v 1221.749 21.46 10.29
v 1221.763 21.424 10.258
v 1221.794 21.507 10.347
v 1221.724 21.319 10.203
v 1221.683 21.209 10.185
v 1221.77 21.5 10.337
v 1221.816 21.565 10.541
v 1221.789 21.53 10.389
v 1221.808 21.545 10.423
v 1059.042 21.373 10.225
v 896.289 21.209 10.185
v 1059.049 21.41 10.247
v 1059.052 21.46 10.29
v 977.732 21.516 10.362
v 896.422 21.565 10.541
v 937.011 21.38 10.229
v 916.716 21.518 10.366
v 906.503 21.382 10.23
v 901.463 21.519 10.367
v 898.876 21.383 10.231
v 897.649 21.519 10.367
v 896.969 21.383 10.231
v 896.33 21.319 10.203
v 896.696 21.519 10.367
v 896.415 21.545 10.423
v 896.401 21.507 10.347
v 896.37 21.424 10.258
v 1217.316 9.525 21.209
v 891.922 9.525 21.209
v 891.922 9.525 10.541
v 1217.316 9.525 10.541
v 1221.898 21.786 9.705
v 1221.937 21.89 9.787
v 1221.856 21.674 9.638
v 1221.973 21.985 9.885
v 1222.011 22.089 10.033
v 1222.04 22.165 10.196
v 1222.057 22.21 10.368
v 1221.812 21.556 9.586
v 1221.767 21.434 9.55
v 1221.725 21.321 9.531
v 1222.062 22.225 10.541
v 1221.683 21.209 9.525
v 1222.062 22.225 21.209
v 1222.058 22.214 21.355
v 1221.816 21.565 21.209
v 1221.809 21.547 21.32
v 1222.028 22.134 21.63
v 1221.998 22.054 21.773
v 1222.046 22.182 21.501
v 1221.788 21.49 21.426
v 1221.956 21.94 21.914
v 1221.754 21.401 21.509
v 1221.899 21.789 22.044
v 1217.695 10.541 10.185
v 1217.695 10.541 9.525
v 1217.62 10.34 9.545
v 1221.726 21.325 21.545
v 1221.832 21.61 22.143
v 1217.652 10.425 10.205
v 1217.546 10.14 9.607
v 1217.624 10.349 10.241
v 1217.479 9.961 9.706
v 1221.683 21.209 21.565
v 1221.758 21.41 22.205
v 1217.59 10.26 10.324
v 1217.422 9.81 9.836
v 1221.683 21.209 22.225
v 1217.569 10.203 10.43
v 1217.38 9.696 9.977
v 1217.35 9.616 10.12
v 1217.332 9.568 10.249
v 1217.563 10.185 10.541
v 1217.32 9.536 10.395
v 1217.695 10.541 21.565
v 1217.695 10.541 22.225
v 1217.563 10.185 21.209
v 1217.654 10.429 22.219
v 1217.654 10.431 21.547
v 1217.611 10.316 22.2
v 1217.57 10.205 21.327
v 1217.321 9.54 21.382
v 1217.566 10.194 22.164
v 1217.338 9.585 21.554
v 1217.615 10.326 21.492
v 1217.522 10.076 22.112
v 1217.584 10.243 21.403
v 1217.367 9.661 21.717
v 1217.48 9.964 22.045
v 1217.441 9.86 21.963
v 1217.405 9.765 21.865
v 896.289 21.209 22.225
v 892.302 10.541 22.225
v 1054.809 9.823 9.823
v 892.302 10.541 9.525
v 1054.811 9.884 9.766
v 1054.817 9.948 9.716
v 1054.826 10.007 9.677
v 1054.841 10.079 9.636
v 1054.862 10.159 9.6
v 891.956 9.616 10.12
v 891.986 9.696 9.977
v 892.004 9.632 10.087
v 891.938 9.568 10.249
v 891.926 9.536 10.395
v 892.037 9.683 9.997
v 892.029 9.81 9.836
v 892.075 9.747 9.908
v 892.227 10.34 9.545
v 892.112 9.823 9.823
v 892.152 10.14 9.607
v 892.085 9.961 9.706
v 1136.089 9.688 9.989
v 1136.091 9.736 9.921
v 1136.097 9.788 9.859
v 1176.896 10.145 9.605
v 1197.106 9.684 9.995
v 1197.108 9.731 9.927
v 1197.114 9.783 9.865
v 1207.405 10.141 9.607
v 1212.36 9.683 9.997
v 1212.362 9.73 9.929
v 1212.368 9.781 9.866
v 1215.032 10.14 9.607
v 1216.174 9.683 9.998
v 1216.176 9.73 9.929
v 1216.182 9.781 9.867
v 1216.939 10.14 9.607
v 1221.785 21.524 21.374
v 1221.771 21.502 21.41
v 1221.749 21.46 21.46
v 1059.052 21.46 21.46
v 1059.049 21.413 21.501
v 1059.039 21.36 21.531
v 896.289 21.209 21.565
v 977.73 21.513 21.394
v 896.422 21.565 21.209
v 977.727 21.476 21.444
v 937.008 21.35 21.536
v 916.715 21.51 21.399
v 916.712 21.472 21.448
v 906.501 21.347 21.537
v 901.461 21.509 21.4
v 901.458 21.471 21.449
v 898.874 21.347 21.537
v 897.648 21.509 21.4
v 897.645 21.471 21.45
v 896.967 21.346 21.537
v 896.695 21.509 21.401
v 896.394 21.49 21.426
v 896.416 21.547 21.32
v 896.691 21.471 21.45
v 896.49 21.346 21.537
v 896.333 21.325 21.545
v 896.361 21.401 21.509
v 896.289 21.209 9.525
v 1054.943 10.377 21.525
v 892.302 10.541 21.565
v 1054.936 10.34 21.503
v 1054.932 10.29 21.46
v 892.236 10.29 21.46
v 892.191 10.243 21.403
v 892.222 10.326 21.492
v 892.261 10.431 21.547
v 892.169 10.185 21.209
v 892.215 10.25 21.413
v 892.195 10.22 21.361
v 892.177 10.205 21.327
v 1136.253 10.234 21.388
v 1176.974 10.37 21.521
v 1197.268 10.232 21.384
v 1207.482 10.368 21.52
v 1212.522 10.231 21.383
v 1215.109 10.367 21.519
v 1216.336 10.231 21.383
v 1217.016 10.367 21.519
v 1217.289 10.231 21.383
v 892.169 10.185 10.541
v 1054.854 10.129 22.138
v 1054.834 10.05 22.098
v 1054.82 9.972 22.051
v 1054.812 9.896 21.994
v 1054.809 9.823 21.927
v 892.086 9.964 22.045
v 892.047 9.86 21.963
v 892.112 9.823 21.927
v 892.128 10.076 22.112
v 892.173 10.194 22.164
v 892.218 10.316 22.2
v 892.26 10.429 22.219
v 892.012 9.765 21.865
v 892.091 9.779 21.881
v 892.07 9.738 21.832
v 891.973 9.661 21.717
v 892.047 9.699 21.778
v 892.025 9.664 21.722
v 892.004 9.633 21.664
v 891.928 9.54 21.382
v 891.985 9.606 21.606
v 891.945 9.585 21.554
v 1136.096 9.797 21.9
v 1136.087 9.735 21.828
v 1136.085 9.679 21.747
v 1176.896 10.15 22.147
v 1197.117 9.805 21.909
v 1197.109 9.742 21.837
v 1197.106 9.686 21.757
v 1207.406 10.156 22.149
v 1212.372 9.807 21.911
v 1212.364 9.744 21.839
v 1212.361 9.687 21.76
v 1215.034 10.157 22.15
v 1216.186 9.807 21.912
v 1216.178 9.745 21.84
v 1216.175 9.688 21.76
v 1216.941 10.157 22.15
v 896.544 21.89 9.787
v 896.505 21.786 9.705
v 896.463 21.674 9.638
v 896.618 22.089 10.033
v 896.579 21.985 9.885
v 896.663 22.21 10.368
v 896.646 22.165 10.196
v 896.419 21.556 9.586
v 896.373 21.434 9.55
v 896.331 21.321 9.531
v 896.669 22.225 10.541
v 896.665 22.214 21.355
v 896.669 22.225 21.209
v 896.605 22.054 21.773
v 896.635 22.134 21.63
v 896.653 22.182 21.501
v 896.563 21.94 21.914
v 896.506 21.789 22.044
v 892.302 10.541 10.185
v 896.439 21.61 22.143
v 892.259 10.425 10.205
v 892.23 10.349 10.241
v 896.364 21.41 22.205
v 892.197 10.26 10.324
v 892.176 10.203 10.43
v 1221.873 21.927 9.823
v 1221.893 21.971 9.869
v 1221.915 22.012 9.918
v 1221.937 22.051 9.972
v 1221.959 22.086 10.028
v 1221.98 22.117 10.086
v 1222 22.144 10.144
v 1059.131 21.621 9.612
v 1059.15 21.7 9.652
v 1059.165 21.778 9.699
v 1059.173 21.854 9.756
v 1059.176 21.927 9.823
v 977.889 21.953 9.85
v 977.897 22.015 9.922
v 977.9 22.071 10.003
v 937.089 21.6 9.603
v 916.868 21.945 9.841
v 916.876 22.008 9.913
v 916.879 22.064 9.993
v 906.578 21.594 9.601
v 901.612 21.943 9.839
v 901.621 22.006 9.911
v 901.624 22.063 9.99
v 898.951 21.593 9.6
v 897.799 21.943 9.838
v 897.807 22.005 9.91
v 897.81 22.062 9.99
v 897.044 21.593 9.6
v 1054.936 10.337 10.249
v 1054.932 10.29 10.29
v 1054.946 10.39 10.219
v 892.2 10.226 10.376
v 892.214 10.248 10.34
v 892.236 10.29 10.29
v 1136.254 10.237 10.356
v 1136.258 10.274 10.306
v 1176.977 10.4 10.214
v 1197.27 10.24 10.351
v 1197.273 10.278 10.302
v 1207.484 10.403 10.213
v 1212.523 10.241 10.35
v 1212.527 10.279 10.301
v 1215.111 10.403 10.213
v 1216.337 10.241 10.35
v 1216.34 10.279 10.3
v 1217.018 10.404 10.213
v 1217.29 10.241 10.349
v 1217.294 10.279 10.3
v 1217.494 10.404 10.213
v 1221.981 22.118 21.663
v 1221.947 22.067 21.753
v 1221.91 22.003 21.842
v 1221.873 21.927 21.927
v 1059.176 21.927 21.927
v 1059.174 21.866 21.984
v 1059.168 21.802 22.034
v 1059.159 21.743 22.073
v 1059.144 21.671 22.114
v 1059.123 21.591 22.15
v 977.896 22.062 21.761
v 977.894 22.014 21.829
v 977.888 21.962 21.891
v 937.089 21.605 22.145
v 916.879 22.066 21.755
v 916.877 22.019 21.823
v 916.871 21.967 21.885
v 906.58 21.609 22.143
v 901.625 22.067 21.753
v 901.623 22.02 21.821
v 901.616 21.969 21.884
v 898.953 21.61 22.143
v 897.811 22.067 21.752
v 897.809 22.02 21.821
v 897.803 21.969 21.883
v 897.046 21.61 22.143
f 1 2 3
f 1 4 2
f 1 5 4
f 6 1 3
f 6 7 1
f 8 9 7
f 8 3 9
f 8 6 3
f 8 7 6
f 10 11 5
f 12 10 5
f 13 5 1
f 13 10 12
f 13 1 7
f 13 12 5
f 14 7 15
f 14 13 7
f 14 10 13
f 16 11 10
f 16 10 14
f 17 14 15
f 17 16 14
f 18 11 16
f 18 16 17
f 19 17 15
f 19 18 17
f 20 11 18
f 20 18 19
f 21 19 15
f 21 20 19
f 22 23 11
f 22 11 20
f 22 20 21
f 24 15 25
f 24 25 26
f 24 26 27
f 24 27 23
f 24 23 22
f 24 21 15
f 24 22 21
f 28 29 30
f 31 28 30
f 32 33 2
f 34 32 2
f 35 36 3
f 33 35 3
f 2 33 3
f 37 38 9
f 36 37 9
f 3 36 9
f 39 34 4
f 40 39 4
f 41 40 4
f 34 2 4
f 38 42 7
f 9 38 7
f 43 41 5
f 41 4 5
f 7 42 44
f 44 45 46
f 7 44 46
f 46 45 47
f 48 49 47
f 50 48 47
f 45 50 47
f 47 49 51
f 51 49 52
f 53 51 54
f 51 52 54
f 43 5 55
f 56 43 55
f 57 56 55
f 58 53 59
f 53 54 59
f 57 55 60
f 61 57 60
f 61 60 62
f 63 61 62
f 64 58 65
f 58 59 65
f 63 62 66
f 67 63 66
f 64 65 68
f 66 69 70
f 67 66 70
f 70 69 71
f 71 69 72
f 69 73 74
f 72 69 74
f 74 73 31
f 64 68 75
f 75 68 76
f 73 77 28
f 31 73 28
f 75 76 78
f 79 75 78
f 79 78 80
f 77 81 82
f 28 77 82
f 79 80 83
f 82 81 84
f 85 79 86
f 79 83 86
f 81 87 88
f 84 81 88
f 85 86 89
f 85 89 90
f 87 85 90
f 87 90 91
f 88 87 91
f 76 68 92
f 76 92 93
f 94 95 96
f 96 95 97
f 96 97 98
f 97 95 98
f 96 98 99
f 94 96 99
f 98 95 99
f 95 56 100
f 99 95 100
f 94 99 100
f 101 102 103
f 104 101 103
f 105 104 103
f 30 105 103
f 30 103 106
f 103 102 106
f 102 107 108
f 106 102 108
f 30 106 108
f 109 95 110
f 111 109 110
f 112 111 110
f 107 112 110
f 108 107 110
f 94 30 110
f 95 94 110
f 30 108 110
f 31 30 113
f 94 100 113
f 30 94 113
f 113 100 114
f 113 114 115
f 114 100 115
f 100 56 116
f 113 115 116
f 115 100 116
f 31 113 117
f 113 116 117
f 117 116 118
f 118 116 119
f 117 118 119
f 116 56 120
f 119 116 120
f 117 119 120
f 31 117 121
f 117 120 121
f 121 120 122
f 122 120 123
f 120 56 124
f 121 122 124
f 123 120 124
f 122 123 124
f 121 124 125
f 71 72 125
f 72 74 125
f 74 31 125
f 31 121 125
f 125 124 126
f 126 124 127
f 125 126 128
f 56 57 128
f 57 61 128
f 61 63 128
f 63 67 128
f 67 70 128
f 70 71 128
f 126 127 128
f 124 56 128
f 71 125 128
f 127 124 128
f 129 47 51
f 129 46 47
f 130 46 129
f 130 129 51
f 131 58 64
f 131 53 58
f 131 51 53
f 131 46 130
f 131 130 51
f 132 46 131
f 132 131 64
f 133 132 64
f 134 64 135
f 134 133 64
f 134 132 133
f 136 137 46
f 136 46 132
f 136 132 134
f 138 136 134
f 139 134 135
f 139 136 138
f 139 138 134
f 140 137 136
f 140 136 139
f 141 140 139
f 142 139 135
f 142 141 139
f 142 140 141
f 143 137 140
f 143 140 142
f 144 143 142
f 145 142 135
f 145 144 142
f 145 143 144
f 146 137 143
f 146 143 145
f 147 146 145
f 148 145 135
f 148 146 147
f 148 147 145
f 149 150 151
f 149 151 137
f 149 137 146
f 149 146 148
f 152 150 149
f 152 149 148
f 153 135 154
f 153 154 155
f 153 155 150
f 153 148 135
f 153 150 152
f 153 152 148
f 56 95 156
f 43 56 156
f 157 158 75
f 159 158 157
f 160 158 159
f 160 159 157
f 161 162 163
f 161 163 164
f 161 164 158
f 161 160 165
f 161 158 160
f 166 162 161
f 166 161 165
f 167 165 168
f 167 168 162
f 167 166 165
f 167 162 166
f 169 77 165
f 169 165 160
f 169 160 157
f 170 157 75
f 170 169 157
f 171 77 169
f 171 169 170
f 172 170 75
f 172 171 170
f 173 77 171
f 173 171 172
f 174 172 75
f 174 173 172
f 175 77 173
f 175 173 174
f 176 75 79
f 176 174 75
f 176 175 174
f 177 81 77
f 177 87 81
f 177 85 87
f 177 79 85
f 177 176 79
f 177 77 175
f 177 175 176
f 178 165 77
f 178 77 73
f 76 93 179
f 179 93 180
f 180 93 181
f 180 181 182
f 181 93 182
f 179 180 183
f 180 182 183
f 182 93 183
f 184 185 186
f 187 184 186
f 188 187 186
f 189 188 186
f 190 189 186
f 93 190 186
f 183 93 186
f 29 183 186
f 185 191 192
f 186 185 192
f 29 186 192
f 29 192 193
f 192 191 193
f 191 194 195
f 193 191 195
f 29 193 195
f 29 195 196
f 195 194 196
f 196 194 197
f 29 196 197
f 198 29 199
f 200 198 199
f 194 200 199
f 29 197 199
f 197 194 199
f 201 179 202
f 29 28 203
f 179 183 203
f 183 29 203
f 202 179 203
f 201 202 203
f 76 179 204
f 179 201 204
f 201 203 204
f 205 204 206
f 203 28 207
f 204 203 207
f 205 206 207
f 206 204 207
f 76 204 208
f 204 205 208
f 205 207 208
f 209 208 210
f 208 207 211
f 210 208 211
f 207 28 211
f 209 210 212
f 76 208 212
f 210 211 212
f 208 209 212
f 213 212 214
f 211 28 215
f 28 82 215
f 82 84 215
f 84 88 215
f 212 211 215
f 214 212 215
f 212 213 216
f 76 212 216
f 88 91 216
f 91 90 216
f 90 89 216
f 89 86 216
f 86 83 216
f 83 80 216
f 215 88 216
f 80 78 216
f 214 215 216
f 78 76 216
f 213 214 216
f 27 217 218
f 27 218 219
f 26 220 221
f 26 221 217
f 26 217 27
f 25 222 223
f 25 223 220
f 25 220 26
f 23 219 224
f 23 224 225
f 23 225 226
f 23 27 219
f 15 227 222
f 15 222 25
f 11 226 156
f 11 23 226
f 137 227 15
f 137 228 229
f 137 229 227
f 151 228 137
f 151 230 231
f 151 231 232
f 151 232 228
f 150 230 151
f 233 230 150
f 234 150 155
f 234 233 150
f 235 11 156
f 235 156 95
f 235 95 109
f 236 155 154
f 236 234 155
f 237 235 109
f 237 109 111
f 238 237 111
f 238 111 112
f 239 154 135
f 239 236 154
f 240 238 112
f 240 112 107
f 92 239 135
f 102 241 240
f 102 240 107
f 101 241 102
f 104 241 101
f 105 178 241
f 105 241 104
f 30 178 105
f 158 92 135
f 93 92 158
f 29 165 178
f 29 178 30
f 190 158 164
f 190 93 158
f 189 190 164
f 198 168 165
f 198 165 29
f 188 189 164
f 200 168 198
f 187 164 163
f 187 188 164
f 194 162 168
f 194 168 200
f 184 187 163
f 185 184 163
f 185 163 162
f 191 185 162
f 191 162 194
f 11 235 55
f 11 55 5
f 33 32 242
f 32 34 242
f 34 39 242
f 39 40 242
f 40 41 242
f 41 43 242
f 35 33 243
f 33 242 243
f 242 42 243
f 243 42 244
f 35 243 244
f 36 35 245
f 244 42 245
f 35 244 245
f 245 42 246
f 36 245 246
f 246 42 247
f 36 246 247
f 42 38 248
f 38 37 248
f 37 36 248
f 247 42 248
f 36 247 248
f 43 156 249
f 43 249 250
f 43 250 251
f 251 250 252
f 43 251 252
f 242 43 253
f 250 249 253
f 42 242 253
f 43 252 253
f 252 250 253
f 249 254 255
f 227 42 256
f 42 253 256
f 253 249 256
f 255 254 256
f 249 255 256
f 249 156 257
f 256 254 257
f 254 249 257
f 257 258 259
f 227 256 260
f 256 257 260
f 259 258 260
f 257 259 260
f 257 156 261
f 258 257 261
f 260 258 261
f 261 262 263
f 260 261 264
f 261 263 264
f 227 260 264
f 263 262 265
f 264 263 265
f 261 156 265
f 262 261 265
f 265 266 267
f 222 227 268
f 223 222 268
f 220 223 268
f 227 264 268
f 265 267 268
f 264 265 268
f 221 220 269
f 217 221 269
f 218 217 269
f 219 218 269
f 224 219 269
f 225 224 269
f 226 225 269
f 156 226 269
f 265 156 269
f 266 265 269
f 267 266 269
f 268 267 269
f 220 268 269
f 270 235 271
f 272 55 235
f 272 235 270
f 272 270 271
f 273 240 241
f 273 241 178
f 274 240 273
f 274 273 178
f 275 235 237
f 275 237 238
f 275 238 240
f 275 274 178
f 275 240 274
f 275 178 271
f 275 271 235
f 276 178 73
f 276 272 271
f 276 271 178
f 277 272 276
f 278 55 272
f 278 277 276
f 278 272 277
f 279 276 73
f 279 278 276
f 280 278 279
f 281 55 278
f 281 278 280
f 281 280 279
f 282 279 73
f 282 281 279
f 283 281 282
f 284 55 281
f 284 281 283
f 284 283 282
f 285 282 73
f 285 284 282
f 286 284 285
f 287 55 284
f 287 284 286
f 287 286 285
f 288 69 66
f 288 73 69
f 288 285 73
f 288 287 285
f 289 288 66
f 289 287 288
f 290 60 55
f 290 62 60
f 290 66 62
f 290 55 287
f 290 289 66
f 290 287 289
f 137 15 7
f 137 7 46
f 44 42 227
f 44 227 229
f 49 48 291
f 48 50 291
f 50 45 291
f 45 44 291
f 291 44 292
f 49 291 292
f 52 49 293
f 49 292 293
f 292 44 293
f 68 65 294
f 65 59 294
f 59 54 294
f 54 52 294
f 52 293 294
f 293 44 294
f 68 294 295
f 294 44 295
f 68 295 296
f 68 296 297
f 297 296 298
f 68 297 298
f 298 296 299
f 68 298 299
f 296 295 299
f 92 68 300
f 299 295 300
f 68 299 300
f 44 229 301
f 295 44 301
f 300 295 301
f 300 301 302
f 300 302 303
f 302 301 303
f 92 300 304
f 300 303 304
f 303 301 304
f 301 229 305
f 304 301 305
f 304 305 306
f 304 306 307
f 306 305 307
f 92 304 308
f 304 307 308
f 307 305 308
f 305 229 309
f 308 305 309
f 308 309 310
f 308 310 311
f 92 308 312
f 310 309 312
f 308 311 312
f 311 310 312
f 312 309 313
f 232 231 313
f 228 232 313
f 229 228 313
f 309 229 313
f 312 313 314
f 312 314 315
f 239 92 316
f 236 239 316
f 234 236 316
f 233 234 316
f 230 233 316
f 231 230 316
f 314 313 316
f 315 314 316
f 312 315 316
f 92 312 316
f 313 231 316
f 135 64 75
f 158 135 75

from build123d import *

# Parameters (mm, degrees)
BOSS_EXTRUDE1_DEPTH = 1320.8
SCALE2_SCALE_X      = 1
SCALE2_SCALE_Y      = 0.4
SCALE2_SCALE_Z      = 0.4
CUT_EXTRUDE1_DEPTH  = 1322.04802369
CUT_EXTRUDE2_DEPTH  = 1322.04802369


with BuildPart() as part:
    # Sketch1 → Boss-Extrude1 (new body)
    with BuildSketch(Plane(origin=(0, 0, 0), x_dir=(0, 0, -1), z_dir=(1, 0, 0))):
        with BuildLine():
            Line((0, 2.54), (0, 29.21))
            ThreePointArc((0, 29.21), (-0.743948776, 31.006051224), (-2.54, 31.75))
            Line((-2.54, 31.75), (-29.21, 31.75))
            ThreePointArc((-29.21, 31.75), (-31.006051224, 31.006051224), (-31.75, 29.21))
            Line((-31.75, 29.21), (-31.75, 2.54))
            ThreePointArc((-31.75, 2.54), (-31.006051224, 0.743948776), (-29.21, 0))
            Line((-29.21, 0), (-2.54, 0))
            ThreePointArc((-2.54, 0), (-0.743948776, 0.743948776), (0, 2.54))
        make_face()
        with BuildLine():
            Line((-1.651, 2.54), (-1.651, 29.21))
            ThreePointArc((-1.651, 29.21), (-1.911382072, 29.838617928), (-2.54, 30.099))
            Line((-2.54, 30.099), (-29.21, 30.099))
            ThreePointArc((-29.21, 30.099), (-29.838617928, 29.838617928), (-30.099, 29.21))
            Line((-30.099, 29.21), (-30.099, 2.54))
            ThreePointArc((-30.099, 2.54), (-29.838617928, 1.911382072), (-29.21, 1.651))
            Line((-29.21, 1.651), (-2.54, 1.651))
            ThreePointArc((-2.54, 1.651), (-1.911382072, 1.911382072), (-1.651, 2.54))
        make_face(mode=Mode.SUBTRACT)
    extrude(amount=BOSS_EXTRUDE1_DEPTH)


with BuildPart() as part_1:
    # Scale2: scaled about (660.4, 15.875, 15.875)
    add(part.part.scale((SCALE2_SCALE_X, SCALE2_SCALE_Y, SCALE2_SCALE_Z), about=(660.4, 15.875, 15.875)))

    # Sketch3 → Cut-Extrude1 (cut, through all)
    with BuildSketch(Plane.XY.offset(22.225)):
        Polygon((896.669001333, 22.225), (891.922323592, 9.525), (863.555279379, 9.525), (863.555279379, 22.225), align=None)
    extrude(amount=-CUT_EXTRUDE1_DEPTH, mode=Mode.SUBTRACT)


with BuildPart() as cut_extrude1_kept_piece:
    # of the separate pieces the step leaves, the one the design keeps (cut_extrude1_pieces_kept)
    add(part_1.part.solids().sort_by_distance((896.289267114, 21.209, 9.525))[0])

    # Sketch4 → Cut-Extrude2 (cut, through all)
    with BuildSketch(Plane.XY.offset(22.225)):
        Polygon((1217.31572696, 9.525), (1320.8, 9.525), (1320.8, 22.225), (1222.062404701, 22.225), align=None)
    extrude(amount=-CUT_EXTRUDE2_DEPTH, mode=Mode.SUBTRACT)


solid = cut_extrude1_kept_piece.part
